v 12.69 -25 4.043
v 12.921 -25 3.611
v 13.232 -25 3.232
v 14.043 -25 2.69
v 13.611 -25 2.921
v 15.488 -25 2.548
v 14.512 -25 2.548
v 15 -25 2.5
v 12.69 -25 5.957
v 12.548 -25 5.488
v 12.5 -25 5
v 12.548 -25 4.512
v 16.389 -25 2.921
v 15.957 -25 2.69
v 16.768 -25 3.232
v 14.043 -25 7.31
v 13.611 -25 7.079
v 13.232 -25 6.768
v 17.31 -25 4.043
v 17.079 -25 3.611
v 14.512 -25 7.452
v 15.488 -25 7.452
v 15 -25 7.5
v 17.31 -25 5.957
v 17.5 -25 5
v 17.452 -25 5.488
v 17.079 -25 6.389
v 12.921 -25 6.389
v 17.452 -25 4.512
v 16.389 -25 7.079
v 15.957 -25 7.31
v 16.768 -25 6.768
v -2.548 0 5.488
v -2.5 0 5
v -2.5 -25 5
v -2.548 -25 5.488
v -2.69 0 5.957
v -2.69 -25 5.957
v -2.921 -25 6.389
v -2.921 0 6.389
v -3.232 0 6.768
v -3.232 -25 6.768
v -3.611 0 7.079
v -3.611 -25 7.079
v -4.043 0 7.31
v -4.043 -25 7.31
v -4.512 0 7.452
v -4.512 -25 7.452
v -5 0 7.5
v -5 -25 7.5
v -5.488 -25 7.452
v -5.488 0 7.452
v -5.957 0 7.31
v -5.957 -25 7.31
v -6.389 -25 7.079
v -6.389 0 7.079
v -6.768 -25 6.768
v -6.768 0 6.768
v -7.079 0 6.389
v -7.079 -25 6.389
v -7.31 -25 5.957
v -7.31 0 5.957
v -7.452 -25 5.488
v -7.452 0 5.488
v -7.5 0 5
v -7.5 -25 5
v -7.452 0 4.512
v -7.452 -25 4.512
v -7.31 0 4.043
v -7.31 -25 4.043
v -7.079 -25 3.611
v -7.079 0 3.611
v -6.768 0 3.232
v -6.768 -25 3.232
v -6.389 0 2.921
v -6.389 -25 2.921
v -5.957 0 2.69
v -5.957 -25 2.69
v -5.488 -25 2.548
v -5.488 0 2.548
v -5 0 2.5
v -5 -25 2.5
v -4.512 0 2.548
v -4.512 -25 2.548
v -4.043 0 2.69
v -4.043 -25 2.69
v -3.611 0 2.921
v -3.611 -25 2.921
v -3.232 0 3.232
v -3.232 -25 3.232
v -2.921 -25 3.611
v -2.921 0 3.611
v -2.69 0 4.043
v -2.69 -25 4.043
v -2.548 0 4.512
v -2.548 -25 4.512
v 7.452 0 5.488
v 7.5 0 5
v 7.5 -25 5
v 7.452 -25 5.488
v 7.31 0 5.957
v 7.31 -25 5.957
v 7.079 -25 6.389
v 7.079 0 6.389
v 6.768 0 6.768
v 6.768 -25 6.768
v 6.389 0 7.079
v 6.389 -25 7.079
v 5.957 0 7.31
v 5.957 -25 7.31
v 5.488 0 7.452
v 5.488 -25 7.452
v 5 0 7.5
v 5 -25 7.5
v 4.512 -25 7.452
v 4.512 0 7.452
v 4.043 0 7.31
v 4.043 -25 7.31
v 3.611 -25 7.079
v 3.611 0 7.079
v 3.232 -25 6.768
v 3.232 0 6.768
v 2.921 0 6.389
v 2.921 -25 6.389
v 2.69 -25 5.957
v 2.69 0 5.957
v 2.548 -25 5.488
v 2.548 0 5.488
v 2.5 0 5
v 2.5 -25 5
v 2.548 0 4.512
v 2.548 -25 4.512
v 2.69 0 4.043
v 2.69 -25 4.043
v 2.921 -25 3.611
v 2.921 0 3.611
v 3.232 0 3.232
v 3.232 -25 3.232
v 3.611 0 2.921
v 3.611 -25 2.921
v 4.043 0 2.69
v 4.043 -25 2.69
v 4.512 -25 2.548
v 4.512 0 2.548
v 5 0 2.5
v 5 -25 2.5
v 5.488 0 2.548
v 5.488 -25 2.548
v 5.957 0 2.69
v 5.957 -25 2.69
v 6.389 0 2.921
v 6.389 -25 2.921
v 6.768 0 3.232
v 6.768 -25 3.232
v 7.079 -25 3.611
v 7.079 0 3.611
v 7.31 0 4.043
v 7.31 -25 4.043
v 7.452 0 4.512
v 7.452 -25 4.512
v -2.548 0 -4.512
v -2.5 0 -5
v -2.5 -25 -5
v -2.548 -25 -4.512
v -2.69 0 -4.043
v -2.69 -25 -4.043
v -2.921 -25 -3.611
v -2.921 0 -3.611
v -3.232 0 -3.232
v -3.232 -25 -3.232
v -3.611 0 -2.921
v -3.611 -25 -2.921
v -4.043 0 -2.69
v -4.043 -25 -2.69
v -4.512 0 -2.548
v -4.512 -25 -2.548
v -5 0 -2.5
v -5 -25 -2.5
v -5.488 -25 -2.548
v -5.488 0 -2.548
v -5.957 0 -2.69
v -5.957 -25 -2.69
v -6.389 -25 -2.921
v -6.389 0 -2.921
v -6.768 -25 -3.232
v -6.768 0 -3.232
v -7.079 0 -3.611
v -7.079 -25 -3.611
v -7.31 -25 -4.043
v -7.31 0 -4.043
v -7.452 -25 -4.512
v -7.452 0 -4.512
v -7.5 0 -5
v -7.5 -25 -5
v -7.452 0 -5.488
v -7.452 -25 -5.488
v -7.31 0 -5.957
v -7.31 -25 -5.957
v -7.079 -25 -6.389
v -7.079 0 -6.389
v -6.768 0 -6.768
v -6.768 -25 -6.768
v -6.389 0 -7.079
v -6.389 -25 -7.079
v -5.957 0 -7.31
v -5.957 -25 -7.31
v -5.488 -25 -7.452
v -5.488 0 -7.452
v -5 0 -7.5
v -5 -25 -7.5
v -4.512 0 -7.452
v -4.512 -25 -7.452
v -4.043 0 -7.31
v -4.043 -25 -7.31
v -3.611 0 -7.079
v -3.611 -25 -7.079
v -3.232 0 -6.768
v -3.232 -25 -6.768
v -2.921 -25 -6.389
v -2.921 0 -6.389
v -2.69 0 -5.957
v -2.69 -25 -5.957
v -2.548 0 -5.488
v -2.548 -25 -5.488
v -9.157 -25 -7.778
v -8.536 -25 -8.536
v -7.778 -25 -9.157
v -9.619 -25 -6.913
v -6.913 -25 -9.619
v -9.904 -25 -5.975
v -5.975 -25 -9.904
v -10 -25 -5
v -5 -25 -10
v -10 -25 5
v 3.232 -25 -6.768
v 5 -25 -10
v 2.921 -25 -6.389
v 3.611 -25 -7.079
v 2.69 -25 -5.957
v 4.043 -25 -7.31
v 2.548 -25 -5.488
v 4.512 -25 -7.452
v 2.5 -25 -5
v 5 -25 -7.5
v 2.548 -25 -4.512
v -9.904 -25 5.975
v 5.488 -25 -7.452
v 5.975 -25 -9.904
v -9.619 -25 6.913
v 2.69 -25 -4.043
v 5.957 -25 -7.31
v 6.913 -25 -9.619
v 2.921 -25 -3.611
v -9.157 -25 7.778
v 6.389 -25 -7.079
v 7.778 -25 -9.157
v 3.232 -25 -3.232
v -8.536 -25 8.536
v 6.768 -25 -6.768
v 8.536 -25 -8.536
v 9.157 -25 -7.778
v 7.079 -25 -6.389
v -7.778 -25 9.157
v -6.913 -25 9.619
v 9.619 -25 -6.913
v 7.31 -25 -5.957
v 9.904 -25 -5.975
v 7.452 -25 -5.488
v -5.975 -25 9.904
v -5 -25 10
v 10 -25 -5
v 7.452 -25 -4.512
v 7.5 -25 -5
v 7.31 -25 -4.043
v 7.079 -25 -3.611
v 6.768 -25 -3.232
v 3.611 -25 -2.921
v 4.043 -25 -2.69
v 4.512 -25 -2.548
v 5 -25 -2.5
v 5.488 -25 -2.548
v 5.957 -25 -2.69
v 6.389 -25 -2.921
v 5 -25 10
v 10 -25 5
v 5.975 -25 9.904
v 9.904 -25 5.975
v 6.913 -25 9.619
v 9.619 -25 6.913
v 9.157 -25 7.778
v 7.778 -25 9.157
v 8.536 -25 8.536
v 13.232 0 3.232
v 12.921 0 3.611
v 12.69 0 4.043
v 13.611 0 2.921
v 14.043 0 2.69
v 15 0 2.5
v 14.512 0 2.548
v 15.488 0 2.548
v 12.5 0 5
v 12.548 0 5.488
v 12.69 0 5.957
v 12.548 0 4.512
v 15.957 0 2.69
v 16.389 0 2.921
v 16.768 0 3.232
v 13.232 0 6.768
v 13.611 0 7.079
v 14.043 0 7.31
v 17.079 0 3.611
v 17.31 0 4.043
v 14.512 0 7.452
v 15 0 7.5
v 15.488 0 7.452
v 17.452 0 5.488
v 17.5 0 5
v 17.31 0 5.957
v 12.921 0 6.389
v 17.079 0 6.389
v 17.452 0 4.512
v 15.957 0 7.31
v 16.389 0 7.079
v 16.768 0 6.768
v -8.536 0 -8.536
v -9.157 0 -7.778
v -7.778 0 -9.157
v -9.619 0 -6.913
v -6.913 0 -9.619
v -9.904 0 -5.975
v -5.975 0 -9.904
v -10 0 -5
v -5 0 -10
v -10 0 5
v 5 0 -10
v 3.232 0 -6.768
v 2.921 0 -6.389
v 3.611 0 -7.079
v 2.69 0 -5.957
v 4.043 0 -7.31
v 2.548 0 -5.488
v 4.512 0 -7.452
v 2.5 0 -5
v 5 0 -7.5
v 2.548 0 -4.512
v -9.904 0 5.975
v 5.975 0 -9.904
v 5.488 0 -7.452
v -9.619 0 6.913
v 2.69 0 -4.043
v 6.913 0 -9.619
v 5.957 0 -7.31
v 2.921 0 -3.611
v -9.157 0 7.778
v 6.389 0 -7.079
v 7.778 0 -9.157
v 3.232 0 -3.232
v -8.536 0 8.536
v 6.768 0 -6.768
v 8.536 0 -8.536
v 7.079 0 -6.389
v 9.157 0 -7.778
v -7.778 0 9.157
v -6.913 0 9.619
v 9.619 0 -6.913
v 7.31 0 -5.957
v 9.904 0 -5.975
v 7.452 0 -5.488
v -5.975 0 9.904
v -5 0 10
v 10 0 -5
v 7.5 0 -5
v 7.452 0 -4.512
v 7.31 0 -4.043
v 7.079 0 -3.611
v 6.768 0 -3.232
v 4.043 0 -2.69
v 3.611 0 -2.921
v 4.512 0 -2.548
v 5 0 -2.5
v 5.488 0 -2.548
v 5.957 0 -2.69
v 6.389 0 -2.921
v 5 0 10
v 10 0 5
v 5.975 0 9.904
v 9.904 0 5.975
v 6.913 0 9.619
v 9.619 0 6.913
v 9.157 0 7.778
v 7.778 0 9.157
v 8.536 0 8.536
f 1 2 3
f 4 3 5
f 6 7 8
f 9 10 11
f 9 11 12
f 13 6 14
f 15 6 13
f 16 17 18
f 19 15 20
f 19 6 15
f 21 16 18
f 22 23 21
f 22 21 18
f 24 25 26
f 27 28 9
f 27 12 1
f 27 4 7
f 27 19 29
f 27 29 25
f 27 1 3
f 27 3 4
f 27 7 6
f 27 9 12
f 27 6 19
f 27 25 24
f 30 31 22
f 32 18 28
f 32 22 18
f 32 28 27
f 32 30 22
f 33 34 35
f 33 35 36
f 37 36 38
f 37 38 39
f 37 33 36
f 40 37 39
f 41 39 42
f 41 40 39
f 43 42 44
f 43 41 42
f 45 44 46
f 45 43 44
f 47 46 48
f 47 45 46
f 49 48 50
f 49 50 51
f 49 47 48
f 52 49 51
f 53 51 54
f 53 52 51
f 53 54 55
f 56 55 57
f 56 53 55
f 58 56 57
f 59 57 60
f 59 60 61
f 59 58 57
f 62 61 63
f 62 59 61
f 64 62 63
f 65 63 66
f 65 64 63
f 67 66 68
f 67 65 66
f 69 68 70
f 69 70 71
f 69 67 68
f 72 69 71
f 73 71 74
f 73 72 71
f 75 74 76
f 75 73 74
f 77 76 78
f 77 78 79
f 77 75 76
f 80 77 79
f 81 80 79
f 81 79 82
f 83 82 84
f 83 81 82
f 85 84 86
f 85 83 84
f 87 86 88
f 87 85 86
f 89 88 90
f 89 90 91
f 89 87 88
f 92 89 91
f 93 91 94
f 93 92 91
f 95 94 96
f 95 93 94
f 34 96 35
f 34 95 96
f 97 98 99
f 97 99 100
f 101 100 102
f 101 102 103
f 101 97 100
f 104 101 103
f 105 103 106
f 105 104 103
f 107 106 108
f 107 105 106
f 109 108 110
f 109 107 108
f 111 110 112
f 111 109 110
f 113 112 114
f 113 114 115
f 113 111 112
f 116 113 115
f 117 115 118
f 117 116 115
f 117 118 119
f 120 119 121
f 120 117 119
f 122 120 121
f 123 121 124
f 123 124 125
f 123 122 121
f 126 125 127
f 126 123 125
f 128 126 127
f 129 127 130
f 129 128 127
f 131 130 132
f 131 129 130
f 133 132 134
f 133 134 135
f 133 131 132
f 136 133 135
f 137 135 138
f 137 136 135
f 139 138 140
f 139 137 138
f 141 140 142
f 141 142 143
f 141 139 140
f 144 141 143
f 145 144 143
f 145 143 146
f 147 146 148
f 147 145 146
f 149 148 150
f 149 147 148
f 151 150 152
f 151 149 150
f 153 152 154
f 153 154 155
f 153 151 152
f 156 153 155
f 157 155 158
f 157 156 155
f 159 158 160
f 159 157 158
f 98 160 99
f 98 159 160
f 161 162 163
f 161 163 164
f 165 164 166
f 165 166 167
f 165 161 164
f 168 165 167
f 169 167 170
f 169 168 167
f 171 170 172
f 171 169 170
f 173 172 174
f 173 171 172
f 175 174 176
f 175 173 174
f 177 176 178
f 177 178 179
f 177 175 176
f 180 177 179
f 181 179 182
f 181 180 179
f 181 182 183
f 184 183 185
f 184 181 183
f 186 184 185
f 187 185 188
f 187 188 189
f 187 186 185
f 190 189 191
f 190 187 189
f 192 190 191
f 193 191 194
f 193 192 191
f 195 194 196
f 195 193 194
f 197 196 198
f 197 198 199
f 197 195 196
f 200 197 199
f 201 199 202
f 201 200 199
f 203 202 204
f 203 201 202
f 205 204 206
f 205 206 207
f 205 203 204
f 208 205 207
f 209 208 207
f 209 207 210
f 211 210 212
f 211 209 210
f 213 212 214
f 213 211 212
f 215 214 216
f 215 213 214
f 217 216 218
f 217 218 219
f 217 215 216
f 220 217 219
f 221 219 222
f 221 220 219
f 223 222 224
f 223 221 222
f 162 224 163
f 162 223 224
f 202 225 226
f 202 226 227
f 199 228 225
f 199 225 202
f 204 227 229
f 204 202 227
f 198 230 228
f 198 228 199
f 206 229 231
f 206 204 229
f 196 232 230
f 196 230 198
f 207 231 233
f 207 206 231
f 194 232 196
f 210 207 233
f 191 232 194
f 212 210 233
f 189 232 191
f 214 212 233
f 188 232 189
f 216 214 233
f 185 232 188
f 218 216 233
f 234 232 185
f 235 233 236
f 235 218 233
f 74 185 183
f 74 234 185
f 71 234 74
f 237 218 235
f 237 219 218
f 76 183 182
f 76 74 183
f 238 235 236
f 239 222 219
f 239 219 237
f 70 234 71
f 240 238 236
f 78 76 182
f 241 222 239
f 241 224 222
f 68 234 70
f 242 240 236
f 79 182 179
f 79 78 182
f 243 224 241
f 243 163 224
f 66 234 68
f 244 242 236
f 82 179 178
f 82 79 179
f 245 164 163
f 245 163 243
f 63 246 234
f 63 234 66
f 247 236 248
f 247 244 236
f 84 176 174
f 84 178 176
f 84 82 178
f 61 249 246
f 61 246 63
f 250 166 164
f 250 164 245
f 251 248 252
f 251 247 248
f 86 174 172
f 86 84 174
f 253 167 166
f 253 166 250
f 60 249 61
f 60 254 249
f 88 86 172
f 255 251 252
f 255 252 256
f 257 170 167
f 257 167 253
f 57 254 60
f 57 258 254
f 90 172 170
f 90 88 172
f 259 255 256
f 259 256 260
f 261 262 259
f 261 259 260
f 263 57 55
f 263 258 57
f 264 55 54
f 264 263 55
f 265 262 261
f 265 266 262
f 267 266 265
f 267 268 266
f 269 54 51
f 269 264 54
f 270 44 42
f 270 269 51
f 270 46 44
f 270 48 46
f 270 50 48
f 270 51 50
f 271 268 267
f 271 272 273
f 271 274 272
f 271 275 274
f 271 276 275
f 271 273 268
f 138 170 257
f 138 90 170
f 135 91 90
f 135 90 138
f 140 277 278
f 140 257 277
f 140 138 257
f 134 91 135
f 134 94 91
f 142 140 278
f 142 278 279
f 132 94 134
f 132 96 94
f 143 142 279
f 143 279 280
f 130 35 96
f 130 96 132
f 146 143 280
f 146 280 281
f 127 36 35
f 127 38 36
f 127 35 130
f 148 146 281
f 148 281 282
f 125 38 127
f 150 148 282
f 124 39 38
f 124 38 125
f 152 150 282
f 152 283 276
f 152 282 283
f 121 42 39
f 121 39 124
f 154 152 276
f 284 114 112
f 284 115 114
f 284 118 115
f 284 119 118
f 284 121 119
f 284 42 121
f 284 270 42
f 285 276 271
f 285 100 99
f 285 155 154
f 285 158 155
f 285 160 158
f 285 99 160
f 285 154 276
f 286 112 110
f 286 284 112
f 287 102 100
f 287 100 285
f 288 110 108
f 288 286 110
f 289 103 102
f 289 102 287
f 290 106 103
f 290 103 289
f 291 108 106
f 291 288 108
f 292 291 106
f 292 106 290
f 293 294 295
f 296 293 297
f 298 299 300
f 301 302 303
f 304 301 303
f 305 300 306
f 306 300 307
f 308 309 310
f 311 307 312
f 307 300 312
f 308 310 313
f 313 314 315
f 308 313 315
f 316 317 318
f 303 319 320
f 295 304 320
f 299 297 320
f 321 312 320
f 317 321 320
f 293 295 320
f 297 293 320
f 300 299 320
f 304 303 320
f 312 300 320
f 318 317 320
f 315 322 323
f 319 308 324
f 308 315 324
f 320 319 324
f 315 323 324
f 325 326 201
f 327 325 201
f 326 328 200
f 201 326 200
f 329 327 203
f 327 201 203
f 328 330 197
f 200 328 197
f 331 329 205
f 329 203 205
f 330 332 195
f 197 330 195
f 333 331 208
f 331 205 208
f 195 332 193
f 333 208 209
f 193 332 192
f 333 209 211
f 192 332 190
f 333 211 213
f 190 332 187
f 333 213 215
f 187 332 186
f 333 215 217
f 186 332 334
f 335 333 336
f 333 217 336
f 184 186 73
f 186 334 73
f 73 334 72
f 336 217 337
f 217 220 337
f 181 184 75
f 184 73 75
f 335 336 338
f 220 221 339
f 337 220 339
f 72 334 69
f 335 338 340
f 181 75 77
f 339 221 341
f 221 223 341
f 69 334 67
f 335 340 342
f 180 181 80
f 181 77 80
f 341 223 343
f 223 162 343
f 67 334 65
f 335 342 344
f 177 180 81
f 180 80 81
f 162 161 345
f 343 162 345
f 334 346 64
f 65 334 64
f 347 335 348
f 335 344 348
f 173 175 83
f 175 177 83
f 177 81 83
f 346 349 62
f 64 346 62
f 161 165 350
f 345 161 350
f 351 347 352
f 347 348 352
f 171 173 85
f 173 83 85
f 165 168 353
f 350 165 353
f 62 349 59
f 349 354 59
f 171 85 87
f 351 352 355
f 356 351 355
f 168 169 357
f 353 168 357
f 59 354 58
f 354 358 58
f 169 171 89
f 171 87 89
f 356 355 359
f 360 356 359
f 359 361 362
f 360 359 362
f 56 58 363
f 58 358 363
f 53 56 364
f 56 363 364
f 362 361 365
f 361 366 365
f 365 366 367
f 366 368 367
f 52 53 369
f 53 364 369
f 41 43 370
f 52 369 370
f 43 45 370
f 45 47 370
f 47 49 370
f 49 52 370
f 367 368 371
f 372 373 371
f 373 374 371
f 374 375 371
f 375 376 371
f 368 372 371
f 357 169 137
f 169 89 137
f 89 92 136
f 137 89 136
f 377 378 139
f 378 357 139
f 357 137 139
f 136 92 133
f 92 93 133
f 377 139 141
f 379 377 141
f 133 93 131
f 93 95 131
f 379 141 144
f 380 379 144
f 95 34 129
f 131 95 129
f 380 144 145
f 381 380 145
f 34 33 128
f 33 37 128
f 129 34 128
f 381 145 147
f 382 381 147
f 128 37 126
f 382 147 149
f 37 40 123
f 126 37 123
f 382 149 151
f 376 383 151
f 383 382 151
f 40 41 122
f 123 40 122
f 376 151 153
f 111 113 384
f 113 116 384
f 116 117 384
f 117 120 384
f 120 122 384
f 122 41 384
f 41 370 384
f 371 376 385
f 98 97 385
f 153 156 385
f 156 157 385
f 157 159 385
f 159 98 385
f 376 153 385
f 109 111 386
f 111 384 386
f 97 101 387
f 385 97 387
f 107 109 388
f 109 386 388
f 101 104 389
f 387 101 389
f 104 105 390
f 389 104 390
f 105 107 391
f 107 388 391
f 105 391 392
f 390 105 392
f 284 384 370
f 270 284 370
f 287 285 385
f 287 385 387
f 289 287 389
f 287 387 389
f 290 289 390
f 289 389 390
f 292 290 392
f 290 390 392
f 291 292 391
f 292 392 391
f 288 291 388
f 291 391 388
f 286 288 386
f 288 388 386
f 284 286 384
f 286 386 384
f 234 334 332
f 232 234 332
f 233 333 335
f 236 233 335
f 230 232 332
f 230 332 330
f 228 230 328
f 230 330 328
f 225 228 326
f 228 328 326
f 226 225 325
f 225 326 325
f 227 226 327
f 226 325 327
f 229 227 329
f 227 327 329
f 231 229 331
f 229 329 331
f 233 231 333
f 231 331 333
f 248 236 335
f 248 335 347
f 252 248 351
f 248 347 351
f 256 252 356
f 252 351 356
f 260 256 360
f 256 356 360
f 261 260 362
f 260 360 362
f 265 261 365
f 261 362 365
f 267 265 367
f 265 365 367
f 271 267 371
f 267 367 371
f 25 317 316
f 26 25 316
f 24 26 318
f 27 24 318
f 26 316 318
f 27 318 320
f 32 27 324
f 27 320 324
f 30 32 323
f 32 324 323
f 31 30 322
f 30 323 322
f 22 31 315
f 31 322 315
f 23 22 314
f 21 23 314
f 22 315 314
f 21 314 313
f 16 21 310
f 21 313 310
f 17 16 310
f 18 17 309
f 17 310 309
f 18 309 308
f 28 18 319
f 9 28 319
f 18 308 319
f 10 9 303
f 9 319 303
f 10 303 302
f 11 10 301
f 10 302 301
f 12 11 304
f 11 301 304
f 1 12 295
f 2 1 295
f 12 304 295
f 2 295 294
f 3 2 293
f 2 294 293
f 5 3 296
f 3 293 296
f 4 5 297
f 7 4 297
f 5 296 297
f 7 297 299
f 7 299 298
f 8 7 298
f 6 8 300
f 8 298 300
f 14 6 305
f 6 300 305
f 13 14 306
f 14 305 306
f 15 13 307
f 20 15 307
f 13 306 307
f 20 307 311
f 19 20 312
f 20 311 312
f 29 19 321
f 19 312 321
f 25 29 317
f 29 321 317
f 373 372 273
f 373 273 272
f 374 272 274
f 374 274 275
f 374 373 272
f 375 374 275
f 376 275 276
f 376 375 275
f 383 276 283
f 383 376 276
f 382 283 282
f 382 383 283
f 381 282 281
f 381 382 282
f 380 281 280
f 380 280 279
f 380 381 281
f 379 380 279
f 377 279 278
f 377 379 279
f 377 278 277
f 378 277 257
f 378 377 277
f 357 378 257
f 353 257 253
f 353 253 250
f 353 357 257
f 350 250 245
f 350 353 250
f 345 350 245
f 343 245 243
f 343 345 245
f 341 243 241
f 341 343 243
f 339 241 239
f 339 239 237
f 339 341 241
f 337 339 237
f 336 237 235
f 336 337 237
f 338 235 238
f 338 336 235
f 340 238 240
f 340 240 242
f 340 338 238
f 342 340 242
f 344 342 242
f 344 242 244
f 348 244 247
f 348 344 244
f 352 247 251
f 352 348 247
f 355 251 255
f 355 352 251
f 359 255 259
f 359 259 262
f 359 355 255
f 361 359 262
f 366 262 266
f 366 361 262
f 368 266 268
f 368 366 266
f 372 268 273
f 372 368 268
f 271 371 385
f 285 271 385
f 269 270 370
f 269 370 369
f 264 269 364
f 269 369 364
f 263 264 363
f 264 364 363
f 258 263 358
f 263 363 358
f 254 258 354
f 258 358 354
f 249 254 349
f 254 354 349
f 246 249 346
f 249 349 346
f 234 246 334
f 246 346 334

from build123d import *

# Parameters (mm, degrees)
F0_R     = 2.5
F1_DEPTH = 25


with BuildPart() as f1:
    # F0 (on Front) → F1 (new body)
    with BuildSketch(Plane.XZ):
        with BuildLine():
            Line((5, 10), (-5, 10))
            ThreePointArc((-5, 10), (-8.535534, 8.535534), (-10, 5))
            Line((-10, 5), (-10, -5))
            ThreePointArc((-10, -5), (-8.535534, -8.535534), (-5, -10))
            Line((-5, -10), (5, -10))
            ThreePointArc((5, -10), (8.535534, -8.535534), (10, -5))
            Line((10, -5), (10, 5))
            ThreePointArc((10, 5), (8.535534, 8.535534), (5, 10))
        make_face()
        with Locations((-5, -5)):
            Circle(F0_R, mode=Mode.SUBTRACT)
        with Locations((5, -5)):
            Circle(F0_R, mode=Mode.SUBTRACT)
        with Locations((-5, 5)):
            Circle(F0_R, mode=Mode.SUBTRACT)
        with Locations((5, 5)):
            Circle(F0_R, mode=Mode.SUBTRACT)
        with Locations((15, 5)):
            Circle(F0_R)
    extrude(amount=F1_DEPTH)


solid = f1.part
